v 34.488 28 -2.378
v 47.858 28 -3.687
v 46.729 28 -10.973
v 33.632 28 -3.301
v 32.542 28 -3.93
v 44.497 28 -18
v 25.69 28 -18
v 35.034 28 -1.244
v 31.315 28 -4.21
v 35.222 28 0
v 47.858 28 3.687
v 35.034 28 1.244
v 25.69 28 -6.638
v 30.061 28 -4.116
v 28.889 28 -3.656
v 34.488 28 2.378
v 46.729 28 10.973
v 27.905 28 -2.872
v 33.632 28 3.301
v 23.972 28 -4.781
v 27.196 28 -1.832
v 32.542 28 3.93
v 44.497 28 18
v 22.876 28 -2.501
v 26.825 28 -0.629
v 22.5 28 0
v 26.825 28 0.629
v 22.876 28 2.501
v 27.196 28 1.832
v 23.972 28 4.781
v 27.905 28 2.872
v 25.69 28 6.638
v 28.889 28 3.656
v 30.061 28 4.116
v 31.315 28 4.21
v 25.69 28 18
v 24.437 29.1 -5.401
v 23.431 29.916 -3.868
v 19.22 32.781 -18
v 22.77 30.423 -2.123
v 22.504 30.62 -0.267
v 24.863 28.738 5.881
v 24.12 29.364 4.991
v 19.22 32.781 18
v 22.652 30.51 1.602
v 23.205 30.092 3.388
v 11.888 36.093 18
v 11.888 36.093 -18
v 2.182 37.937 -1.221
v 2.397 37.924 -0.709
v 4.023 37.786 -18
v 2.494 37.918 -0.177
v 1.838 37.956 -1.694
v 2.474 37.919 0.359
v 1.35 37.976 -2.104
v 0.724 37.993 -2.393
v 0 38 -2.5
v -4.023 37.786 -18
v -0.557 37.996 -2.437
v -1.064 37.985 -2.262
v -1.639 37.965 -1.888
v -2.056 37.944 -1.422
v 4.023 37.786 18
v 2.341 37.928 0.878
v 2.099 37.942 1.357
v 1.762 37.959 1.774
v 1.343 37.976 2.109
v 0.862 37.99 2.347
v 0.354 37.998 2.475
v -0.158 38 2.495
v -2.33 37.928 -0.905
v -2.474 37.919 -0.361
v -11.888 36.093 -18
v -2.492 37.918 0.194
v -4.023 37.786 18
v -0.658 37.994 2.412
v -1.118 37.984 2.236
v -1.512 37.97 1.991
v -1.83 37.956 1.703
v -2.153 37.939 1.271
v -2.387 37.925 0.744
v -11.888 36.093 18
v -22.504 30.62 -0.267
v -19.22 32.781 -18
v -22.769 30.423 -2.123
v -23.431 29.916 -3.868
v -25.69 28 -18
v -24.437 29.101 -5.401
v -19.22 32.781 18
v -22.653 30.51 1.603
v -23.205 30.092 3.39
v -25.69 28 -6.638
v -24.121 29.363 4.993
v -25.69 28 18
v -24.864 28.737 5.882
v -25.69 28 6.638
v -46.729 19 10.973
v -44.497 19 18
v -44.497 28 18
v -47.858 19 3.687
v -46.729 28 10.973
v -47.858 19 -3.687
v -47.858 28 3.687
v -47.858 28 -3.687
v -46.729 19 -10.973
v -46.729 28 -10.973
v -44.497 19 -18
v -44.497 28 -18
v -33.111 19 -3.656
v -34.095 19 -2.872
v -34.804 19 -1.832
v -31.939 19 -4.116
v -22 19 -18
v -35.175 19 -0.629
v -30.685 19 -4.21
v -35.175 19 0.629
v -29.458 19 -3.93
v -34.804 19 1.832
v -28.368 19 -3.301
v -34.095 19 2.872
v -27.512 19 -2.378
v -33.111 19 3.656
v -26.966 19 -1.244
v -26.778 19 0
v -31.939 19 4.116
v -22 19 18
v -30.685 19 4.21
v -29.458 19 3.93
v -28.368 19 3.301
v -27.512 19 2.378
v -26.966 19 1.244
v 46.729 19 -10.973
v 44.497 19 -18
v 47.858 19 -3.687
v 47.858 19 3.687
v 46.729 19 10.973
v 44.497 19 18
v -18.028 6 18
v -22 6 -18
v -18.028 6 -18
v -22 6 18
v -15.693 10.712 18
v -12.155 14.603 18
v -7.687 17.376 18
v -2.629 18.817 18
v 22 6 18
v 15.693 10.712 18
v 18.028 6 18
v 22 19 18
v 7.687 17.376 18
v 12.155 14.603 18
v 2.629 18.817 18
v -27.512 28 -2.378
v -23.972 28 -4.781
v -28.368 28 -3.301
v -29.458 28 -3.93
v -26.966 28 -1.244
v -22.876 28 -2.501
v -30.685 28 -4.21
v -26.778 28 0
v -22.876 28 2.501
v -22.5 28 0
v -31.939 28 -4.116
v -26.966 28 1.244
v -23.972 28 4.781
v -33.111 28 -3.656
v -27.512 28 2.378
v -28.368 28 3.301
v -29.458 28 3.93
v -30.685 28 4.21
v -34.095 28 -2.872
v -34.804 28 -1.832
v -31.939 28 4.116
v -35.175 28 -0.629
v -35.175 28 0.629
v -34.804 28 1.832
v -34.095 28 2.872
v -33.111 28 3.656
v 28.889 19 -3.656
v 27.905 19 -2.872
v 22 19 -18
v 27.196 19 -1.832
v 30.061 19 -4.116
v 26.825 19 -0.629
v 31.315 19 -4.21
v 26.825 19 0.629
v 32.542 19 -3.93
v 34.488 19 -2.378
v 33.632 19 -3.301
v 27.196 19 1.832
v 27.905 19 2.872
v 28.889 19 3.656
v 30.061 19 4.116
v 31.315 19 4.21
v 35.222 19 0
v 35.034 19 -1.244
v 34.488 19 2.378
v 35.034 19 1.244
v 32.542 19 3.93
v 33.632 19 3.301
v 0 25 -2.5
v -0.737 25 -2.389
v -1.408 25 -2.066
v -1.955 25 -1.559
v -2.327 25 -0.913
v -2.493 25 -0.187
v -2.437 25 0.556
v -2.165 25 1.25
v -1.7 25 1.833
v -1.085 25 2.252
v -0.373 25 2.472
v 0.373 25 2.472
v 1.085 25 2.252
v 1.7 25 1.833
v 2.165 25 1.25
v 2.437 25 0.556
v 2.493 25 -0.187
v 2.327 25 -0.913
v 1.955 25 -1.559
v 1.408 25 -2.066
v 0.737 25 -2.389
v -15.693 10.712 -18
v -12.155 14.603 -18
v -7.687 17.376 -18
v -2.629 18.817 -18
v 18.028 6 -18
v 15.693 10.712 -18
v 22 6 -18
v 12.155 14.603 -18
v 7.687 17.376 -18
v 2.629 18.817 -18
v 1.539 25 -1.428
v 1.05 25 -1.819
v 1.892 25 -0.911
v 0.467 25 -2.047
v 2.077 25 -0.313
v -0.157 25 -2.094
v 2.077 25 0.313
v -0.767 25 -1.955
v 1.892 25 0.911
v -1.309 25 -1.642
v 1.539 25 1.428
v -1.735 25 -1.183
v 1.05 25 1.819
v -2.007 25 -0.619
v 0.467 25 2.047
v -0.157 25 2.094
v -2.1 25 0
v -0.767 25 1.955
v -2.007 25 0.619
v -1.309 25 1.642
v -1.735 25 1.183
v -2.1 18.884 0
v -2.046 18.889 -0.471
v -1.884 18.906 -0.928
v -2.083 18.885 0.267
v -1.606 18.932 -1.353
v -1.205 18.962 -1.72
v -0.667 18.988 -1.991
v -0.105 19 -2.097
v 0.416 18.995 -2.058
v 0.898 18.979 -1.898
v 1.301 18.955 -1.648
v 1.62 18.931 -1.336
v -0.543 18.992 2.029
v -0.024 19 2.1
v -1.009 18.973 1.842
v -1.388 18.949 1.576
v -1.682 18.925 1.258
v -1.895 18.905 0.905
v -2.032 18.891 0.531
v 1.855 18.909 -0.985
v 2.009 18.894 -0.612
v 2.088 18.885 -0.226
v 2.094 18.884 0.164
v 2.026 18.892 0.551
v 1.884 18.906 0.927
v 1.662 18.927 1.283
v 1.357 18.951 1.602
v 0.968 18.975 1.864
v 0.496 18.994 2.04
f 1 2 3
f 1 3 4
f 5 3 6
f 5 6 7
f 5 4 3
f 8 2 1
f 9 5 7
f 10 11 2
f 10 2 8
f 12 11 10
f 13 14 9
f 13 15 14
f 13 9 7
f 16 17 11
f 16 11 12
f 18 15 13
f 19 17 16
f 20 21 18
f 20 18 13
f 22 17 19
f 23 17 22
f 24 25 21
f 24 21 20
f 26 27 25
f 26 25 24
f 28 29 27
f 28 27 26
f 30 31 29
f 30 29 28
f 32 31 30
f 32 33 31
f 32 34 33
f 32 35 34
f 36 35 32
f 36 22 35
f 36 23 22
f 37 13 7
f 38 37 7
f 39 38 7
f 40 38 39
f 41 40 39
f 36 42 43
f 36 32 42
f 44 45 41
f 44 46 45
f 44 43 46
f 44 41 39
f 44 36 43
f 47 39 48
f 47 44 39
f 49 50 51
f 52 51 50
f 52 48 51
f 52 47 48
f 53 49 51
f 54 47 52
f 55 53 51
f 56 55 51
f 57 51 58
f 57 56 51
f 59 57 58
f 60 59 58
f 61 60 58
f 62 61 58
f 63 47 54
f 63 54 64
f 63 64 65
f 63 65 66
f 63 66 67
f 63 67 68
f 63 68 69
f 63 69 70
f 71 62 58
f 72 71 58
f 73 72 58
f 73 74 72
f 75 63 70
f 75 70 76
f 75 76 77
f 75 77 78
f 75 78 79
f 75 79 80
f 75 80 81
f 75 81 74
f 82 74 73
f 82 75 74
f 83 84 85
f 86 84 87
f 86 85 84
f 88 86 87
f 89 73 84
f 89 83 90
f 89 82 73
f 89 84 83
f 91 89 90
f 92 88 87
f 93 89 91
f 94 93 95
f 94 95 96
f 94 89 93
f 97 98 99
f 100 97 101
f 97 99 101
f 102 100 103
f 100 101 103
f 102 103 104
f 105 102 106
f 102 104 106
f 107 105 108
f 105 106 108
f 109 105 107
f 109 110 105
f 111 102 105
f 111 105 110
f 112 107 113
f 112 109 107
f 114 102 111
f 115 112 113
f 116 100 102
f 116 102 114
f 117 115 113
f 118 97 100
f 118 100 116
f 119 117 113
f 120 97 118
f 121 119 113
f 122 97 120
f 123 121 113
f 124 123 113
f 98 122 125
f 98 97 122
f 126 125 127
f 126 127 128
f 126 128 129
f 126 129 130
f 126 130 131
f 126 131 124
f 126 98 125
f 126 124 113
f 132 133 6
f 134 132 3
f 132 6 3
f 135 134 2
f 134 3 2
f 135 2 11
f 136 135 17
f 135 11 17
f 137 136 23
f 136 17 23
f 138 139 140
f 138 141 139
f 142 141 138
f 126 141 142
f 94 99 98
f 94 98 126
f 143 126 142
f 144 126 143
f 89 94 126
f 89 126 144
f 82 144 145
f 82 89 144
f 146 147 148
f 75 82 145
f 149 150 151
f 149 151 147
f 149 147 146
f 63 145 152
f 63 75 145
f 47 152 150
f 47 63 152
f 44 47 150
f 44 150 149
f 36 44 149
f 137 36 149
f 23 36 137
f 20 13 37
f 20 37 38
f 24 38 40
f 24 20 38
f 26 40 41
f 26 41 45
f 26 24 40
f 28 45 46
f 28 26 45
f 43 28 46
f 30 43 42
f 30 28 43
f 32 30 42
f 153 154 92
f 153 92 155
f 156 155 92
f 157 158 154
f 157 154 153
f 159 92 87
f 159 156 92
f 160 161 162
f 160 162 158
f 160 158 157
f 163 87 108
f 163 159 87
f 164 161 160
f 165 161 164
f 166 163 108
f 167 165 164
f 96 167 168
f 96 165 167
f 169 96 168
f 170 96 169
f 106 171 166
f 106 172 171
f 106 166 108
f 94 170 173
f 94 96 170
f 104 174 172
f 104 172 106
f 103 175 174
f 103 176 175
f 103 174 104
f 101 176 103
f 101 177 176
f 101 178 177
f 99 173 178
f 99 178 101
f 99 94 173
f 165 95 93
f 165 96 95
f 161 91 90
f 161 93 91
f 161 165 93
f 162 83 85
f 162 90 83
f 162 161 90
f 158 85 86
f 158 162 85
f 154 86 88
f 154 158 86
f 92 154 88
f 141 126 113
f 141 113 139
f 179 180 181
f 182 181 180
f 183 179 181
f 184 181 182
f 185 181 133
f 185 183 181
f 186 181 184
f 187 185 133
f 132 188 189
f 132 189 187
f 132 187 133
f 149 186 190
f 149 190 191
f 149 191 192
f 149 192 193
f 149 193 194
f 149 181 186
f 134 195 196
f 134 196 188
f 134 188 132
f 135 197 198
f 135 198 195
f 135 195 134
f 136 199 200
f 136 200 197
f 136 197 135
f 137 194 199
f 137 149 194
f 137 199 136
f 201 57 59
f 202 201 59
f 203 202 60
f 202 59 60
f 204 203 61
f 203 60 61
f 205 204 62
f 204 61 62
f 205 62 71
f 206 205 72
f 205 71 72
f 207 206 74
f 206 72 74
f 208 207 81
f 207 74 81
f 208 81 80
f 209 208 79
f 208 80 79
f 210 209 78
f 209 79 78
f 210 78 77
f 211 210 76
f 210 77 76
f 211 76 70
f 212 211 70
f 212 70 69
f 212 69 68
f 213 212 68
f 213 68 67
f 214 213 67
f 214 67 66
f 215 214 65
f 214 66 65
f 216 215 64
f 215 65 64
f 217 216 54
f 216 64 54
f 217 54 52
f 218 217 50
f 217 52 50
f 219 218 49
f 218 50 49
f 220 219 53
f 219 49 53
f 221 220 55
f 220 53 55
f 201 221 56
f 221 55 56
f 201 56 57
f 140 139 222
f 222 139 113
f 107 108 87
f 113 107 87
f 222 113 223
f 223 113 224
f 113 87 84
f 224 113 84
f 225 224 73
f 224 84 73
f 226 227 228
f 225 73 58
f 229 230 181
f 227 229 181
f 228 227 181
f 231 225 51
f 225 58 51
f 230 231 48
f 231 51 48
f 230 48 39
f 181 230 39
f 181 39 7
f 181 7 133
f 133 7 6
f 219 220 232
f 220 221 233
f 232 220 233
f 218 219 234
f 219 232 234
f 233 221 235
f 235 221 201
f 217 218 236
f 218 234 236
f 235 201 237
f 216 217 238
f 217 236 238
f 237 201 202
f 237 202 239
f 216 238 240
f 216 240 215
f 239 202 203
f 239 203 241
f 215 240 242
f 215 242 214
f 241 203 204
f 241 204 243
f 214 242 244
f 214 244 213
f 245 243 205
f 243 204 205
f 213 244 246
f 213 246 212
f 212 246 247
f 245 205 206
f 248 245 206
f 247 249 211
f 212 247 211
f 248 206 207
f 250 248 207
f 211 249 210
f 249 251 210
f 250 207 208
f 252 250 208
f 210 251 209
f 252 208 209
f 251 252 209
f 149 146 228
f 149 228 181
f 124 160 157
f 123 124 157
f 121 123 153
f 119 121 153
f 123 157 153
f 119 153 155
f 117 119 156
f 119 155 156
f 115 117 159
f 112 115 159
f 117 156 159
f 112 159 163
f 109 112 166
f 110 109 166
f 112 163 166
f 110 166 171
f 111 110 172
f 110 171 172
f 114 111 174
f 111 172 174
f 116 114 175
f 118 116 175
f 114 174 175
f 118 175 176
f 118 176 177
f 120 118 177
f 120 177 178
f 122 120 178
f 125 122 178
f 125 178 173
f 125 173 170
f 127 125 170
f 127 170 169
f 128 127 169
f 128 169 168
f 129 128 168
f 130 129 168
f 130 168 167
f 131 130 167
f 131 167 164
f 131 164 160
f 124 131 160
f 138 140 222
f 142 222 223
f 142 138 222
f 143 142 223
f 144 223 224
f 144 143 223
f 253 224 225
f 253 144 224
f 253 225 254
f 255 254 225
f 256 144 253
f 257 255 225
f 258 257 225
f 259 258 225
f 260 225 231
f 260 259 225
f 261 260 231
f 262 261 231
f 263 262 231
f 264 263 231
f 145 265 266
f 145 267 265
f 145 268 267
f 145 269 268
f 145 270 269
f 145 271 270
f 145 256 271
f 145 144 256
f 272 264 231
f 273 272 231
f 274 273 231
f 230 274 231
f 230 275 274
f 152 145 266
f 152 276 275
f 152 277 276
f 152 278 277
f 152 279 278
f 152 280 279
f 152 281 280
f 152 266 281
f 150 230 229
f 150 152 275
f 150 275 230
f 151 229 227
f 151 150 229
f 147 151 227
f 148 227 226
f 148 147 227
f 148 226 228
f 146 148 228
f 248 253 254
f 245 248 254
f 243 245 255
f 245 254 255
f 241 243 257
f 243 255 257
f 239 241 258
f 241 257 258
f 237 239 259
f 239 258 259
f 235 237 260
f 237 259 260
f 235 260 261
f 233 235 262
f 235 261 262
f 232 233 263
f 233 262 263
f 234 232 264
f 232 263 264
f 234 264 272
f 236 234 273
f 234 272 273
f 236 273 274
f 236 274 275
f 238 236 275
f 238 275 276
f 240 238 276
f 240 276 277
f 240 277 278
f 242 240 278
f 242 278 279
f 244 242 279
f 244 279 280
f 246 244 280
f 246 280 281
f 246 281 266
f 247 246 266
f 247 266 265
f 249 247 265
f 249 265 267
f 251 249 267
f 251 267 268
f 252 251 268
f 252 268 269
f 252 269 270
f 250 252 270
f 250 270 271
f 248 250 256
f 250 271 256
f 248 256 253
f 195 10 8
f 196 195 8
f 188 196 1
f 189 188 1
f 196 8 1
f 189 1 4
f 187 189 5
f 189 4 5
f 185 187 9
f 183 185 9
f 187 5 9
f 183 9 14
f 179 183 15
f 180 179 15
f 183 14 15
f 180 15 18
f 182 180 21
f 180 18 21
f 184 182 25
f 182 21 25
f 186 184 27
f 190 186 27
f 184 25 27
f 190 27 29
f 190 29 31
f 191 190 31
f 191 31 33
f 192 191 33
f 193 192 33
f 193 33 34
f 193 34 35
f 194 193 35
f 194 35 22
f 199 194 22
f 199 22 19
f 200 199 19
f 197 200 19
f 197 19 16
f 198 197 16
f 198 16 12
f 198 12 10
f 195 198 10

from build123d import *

# Parameters (mm, degrees)
BOSS_EXTRUDE1_DEPTH            = 18
CUT_EXTRUDE1_REACH             = 24
SKETCH2_R                      = 4.221723053
CUT_EXTRUDE1_DIRECTION_2_DEPTH = 11
SKETCH3_R                      = 8.5
CUT_EXTRUDE2_DEPTH             = 36
SKETCH18_W                     = 2.5
SKETCH18_H                     = 13
M5_TAPPED_HOLE1_D              = 4.2


with BuildPart() as part:
    # Sketch1 → Boss-Extrude1 (new body, symmetric)
    with BuildSketch(Plane.XY):
        with BuildLine():
            Line((18.027756377, 6), (22, 6))
            Line((22, 6), (22, 19))
            Line((22, 19), (49, 19))
            Line((49, 19), (49, 28))
            Line((49, 28), (25.690465157, 28))
            ThreePointArc((25.690465157, 28), (0, 38), (-25.690465157, 28))
            Line((-25.690465157, 28), (-49, 28))
            Line((-49, 28), (-49, 19))
            Line((-49, 19), (-22, 19))
            Line((-22, 19), (-22, 6))
            Line((-22, 6), (-18.027756377, 6))
            ThreePointArc((-18.027756377, 6), (0, 19), (18.027756377, 6))
        make_face()
    extrude(amount=BOSS_EXTRUDE1_DEPTH, both=True)

    # Sketch2 → Cut-Extrude1 (cut, up to next)
    with BuildSketch(Plane(origin=(0, 28, 0), x_dir=(1, 0, 0), z_dir=(0, 1, 0)), mode=Mode.PRIVATE) as cut_extrude1_sk1:
        with Locations((-31, 0)):
            Circle(SKETCH2_R)
    cut_extrude1_tool1 = extrude(cut_extrude1_sk1.sketch, amount=-CUT_EXTRUDE1_REACH, mode=Mode.PRIVATE) & part.part
    add(cut_extrude1_tool1.solids().sort_by_distance((-31, 28, 0))[0], mode=Mode.SUBTRACT)
    # Sketch2 → Cut-Extrude1 (cut, up to next)
    with BuildSketch(Plane(origin=(0, 28, 0), x_dir=(1, 0, 0), z_dir=(0, 1, 0)), mode=Mode.PRIVATE) as cut_extrude1_sk2:
        with Locations((31, 0)):
            Circle(SKETCH2_R)
    cut_extrude1_tool2 = extrude(cut_extrude1_sk2.sketch, amount=-CUT_EXTRUDE1_REACH, mode=Mode.PRIVATE) & part.part
    add(cut_extrude1_tool2.solids().sort_by_distance((31, 28, 0))[0], mode=Mode.SUBTRACT)
    # Sketch2 → Cut-Extrude1 (cut, up to next)
    with BuildSketch(Plane(origin=(0, 28, 0), x_dir=(1, 0, 0), z_dir=(0, 1, 0)), mode=Mode.PRIVATE) as cut_extrude1_sk3:
        with BuildLine():
            Line((-44.497190923, 18), (-49, 18))
            Line((-49, 18), (-49, -18))
            Line((-49, -18), (-44.497190923, -18))
            ThreePointArc((-44.497190923, -18), (-48, 0), (-44.497190923, 18))
        make_face()
    cut_extrude1_tool3 = extrude(cut_extrude1_sk3.sketch, amount=-CUT_EXTRUDE1_REACH, mode=Mode.PRIVATE) & part.part
    add(cut_extrude1_tool3.solids().sort_by_distance((-48.362805, 28, 0))[0], mode=Mode.SUBTRACT)
    # Sketch2 → Cut-Extrude1 (cut, up to next)
    with BuildSketch(Plane(origin=(0, 28, 0), x_dir=(1, 0, 0), z_dir=(0, 1, 0)), mode=Mode.PRIVATE) as cut_extrude1_sk4:
        with BuildLine():
            Line((44.497190923, -18), (49, -18))
            Line((49, -18), (49, 18))
            Line((49, 18), (44.497190923, 18))
            ThreePointArc((44.497190923, 18), (48, 0), (44.497190923, -18))
        make_face()
    cut_extrude1_tool4 = extrude(cut_extrude1_sk4.sketch, amount=-CUT_EXTRUDE1_REACH, mode=Mode.PRIVATE) & part.part
    add(cut_extrude1_tool4.solids().sort_by_distance((46.748595, 28, 17.637195))[0], mode=Mode.SUBTRACT)

    # Sketch2 → Cut-Extrude1 direction 2 (cut)
    with BuildSketch(Plane(origin=(0, 28, 0), x_dir=(1, 0, 0), z_dir=(0, 1, 0))):
        with Locations((-31, 0)):
            Circle(SKETCH2_R)
        with Locations((31, 0)):
            Circle(SKETCH2_R)
        with BuildLine():
            Line((-44.497190923, 18), (-49, 18))
            Line((-49, 18), (-49, -18))
            Line((-49, -18), (-44.497190923, -18))
            ThreePointArc((-44.497190923, -18), (-48, 0), (-44.497190923, 18))
        make_face()
        with BuildLine():
            Line((44.497190923, -18), (49, -18))
            Line((49, -18), (49, 18))
            Line((49, 18), (44.497190923, 18))
            ThreePointArc((44.497190923, 18), (48, 0), (44.497190923, -18))
        make_face()
    extrude(amount=CUT_EXTRUDE1_DIRECTION_2_DEPTH, mode=Mode.SUBTRACT)

    # Sketch3 → Cut-Extrude2 (cut)
    with BuildSketch(Plane(origin=(0, 28, 0), x_dir=(1, 0, 0), z_dir=(0, 1, 0))):
        with Locations((-31, 0)):
            Circle(SKETCH3_R)
        with Locations((31, 0)):
            Circle(SKETCH3_R)
    extrude(amount=CUT_EXTRUDE2_DEPTH, mode=Mode.SUBTRACT)

    # Sketch18 → M6 Tapped Hole2 (revolve, cut)
    with BuildSketch(Plane(origin=(0, 25, 0), x_dir=(0, 0, -1), z_dir=(1, 0, 0))):
        with Locations((1.25, 6.5)):
            Rectangle(SKETCH18_W, SKETCH18_H)
    revolve(axis=Axis((0, 18.65, 0), (0, 1, 0)), mode=Mode.SUBTRACT)

    # M5 Tapped Hole1 (through all)
    with Locations(Plane(origin=(0, 25, 0), x_dir=(1, 0, 0), z_dir=(0, 1, 0))):
        with Locations((0, 0)):
            Hole(M5_TAPPED_HOLE1_D / 2)


solid = part.part
